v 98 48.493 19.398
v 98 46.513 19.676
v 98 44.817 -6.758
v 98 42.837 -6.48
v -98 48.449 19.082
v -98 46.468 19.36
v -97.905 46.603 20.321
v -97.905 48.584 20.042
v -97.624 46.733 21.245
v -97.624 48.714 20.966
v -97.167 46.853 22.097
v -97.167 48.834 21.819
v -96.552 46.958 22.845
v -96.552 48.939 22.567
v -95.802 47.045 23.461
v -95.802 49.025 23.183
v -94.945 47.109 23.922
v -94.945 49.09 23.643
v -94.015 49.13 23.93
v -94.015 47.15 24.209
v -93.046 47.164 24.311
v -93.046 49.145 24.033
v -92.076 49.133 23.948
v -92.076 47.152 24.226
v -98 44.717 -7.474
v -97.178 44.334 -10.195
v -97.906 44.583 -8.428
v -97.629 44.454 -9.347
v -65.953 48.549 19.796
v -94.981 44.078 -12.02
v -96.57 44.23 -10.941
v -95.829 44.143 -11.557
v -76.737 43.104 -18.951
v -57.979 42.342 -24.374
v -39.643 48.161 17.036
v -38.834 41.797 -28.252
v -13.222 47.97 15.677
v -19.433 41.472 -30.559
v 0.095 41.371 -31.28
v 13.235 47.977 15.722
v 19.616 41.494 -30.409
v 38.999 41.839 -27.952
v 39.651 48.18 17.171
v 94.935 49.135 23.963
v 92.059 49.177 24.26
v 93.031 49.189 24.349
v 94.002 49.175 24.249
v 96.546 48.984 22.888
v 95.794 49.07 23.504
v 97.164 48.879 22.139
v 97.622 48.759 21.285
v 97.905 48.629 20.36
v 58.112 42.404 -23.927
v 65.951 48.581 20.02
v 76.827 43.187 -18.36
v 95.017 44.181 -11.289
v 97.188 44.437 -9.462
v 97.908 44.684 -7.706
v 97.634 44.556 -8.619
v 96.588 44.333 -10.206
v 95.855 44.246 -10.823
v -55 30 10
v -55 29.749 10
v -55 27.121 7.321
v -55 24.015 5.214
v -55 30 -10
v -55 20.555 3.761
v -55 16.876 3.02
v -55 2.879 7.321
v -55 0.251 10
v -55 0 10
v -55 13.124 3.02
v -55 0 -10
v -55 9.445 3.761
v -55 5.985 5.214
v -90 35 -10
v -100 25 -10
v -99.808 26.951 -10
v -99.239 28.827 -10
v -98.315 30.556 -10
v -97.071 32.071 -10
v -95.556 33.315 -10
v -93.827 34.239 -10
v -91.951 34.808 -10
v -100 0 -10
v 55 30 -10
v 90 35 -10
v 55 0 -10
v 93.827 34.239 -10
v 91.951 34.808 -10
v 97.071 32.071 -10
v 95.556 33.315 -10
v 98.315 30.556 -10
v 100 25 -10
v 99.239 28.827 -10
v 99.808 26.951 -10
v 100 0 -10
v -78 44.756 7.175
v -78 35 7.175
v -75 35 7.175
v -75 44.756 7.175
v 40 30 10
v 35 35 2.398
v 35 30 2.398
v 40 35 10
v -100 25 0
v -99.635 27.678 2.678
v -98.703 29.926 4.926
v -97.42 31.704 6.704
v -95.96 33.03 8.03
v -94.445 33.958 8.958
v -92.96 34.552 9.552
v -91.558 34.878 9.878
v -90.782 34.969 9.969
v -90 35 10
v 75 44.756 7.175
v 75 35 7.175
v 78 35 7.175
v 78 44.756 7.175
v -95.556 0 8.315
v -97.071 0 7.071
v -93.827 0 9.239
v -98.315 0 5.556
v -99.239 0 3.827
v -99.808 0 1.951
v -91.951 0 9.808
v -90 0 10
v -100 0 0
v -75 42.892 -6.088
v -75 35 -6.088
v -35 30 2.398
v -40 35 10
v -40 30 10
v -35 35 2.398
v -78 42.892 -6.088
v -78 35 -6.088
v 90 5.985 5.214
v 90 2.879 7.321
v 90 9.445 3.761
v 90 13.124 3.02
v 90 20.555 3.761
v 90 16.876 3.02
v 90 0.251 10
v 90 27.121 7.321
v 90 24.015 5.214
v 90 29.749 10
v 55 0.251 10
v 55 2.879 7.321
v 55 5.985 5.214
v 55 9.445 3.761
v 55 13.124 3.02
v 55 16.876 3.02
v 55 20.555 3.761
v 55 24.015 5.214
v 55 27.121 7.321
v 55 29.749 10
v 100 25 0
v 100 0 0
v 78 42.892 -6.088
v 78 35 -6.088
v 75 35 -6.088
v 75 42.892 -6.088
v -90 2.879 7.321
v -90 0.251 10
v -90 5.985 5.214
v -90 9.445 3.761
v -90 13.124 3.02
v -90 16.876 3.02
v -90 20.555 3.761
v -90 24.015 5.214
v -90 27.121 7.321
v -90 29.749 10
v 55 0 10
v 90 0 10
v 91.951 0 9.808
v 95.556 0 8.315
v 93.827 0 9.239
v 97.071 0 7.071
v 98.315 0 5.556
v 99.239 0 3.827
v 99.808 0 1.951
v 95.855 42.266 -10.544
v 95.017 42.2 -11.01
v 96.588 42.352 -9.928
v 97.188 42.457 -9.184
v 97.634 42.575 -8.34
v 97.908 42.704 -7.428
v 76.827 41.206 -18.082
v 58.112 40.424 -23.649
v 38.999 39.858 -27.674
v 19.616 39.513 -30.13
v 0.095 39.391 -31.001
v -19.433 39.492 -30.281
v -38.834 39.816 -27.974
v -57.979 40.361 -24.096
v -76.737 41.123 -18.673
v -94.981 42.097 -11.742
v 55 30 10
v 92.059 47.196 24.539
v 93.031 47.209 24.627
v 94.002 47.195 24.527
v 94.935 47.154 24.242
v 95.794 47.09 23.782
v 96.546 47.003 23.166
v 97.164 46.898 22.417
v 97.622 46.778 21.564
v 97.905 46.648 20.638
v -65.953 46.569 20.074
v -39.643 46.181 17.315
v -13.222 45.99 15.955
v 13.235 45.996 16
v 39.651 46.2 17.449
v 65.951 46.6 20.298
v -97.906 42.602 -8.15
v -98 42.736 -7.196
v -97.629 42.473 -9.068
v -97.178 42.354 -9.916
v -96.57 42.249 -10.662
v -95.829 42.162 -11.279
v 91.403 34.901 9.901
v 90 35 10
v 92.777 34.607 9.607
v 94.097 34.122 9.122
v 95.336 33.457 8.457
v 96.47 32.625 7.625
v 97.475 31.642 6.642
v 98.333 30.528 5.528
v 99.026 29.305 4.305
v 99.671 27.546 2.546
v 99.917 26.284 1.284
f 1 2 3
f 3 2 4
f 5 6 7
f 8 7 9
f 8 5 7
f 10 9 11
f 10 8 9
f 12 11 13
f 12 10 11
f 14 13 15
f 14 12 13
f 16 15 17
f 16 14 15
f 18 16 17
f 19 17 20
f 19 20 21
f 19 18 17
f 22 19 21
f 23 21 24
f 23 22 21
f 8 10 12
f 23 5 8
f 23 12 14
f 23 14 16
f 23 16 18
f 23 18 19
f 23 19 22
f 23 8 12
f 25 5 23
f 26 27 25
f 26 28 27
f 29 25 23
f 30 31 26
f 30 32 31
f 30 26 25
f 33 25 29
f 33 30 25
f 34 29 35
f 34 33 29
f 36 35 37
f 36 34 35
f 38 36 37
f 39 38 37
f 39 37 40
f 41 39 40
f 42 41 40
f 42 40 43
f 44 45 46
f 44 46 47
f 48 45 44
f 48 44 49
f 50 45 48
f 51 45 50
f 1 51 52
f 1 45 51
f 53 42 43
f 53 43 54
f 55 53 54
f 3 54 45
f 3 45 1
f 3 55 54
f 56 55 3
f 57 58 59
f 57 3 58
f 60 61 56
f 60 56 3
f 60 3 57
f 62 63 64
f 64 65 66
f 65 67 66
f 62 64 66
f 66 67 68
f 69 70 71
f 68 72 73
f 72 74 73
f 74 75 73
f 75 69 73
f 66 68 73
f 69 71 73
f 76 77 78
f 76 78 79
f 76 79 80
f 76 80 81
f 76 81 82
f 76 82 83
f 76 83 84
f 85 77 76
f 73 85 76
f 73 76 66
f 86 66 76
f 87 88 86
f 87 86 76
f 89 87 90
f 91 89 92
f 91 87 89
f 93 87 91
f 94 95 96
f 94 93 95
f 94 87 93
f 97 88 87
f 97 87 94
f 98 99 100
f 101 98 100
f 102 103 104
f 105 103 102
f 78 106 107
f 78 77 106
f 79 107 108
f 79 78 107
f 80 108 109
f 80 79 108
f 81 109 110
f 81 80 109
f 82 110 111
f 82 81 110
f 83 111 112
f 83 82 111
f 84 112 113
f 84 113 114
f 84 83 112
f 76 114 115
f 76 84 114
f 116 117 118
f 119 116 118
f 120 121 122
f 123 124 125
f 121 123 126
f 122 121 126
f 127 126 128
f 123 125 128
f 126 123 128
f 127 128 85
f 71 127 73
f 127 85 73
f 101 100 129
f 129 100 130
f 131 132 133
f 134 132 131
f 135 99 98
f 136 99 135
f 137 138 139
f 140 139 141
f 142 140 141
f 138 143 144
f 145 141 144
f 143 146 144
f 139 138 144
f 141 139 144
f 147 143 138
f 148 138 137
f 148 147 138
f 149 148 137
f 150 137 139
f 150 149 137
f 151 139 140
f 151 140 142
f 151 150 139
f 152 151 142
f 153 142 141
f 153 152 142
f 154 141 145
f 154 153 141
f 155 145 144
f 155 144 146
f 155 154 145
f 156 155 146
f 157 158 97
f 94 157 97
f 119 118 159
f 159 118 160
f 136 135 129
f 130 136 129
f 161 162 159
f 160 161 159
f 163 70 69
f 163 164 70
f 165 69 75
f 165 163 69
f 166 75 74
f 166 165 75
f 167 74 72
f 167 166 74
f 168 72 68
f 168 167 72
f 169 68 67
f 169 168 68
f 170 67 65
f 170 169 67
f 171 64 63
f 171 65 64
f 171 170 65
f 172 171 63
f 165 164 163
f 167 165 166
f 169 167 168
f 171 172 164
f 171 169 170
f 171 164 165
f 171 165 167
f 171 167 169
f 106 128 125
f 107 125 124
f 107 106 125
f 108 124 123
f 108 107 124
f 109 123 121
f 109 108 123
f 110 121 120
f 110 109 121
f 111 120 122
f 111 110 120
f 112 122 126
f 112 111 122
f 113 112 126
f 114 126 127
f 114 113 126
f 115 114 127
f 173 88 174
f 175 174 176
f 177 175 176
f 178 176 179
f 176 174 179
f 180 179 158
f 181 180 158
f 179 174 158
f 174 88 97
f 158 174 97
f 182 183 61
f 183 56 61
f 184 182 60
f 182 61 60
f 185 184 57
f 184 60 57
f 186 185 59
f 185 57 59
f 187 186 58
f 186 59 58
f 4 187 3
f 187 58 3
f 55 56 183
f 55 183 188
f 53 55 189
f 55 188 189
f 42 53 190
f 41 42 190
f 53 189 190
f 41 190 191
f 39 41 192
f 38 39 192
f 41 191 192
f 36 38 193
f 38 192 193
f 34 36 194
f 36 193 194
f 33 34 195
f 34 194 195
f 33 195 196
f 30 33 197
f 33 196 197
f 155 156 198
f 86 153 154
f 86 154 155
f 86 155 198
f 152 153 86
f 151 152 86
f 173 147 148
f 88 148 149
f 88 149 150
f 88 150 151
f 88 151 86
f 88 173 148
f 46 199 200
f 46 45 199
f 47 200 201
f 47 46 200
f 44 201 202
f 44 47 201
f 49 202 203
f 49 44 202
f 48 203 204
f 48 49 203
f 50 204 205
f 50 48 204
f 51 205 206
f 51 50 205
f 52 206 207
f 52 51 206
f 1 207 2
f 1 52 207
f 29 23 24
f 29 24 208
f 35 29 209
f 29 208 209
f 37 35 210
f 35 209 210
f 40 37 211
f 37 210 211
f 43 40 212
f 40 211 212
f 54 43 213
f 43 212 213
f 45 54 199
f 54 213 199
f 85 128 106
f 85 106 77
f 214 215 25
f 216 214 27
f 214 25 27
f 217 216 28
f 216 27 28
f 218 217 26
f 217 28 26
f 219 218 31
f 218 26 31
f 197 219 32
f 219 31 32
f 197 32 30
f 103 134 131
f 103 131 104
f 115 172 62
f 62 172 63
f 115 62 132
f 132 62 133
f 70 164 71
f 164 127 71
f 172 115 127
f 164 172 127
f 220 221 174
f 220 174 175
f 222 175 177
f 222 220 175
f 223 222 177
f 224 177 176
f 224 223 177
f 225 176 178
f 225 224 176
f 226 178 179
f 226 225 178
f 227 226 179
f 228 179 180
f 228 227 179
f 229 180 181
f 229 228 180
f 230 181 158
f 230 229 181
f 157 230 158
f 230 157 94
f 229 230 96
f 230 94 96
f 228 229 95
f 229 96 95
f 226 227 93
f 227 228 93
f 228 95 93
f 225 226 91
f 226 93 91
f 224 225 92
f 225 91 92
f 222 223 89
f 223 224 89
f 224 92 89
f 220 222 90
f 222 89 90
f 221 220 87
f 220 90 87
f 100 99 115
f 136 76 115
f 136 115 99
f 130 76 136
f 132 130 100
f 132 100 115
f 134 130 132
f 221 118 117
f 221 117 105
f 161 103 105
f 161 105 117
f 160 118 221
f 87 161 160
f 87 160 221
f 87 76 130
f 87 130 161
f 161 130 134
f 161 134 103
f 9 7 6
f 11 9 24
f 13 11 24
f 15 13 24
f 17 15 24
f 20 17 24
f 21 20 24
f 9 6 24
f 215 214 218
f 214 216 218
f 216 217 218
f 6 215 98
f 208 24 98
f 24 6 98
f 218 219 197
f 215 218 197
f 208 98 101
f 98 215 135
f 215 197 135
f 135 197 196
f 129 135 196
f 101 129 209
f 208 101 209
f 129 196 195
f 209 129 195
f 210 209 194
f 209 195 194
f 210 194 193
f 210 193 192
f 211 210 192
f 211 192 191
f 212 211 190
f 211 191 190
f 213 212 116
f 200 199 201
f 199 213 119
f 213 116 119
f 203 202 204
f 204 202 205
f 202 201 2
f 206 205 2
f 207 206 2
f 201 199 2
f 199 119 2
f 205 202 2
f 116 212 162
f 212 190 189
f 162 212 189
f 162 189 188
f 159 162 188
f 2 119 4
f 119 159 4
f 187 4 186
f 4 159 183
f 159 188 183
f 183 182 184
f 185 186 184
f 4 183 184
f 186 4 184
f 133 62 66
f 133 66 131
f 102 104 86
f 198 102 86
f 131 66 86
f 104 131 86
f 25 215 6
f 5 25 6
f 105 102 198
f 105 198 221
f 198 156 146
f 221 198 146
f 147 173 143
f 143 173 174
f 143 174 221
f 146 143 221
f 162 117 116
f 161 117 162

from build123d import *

# Parameters (mm, degrees)
SKETCH1_W               = 45
SKETCH1_H               = 20
BOSS_EXTRUDE1_DEPTH     = 30
BOSS_EXTRUDE1_2_DEPTH   = 30
CUT_EXTRUDE1_DEPTH      = 90
CUT_EXTRUDE1_DEPTH_BACK = 90
SKETCH2_R               = 18.91234553
SKETCH4_W               = 200
SKETCH4_H               = 20
BOSS_EXTRUDE2_DEPTH     = 5
FILLET1_R               = 10
SKETCH5_W               = 3
SKETCH5_H               = 13.263798278
BOSS_EXTRUDE3_DEPTH     = 10
CHAMFER1_SIZE           = 2.108112521
CHAMFER1_SIZE_2         = 15
BOSS_EXTRUDE4_DEPTH     = 2
FILLET2_R               = 5
CUT_EXTRUDE2_DEPTH      = 111.469562822


# Some blends are built 0.0001 mm under size
with BuildPart() as part:
    # Sketch1 → Boss-Extrude1 (new body)
    with BuildSketch(Plane(origin=(0, 0, 0), x_dir=(1, 0, 0), z_dir=(0, 1, 0))):
        with Locations((-77.5, 0)):
            Rectangle(SKETCH1_W, SKETCH1_H)
    extrude(amount=BOSS_EXTRUDE1_DEPTH)


with BuildPart() as body_2:
    # Sketch1 → Boss-Extrude1 2 (new body)
    with BuildSketch(Plane(origin=(0, 0, 0), x_dir=(1, 0, 0), z_dir=(0, 1, 0))):
        with Locations((77.5, 0)):
            Rectangle(SKETCH1_W, SKETCH1_H)
    extrude(amount=BOSS_EXTRUDE1_2_DEPTH)


with BuildPart() as cut_extrude1_tool:
    # Sketch2 → Cut-Extrude1 (new, two sides: drawn at the far end of the back side and taken through both)
    with BuildSketch(Plane(origin=(0, 0, 0), x_dir=(0, 0, -1), z_dir=(1, 0, 0)).offset(-CUT_EXTRUDE1_DEPTH_BACK)):
        with Locations((-21.83879207, 15)):
            Circle(SKETCH2_R)
    extrude(amount=CUT_EXTRUDE1_DEPTH + CUT_EXTRUDE1_DEPTH_BACK)


with BuildPart() as part_1:
    add(part.part)

    # Cut-Extrude1: cut by cut_extrude1_tool
    add(cut_extrude1_tool.part, mode=Mode.SUBTRACT)



with BuildPart() as body_2_1:
    add(body_2.part)

    # Cut-Extrude1: cut by cut_extrude1_tool
    add(cut_extrude1_tool.part, mode=Mode.SUBTRACT)


with BuildPart() as part_2:
    add(part_1.part)

    add(body_2_1.part)  # Boss-Extrude2 merges body 2
    # Sketch4 → Boss-Extrude2 (add)
    with BuildSketch(Plane(origin=(0, 30, 0), x_dir=(1, 0, 0), z_dir=(0, 1, 0))):
        Rectangle(SKETCH4_W, SKETCH4_H)
    extrude(amount=BOSS_EXTRUDE2_DEPTH)

    # Fillet1
    fillet1_edges = [part_2.edges().sort_by_distance(p)[0] for p in [
        (100, 17.5, 10),
        (-100, 35, 0),
        (100, 35, 0),
        (-100, 17.5, 10),
    ]]
    fillet(fillet1_edges, radius=FILLET1_R - 0.0001)  # a hair under: the kernel refuses the full size

    # Sketch5 → Boss-Extrude3 (add)
    with BuildSketch(Plane(origin=(0, 35, 0), x_dir=(1, 0, 0), z_dir=(0, 1, 0))):
        with Locations((-76.5, -0.54359829)):
            Rectangle(SKETCH5_W, SKETCH5_H)
        with Locations((76.5, -0.54359829)):
            Rectangle(SKETCH5_W, SKETCH5_H)
    extrude(amount=BOSS_EXTRUDE3_DEPTH)

    # Chamfer1
    # the kernel refuses this chamfer: 15, 2.108112521 mm, written as the material it takes off along each edge
    with BuildSketch(Plane(origin=(-116.985961034, 45, -6.088300849), x_dir=(0, -0.9651598825854408, -0.26166085119417143), z_dir=(1, 0, 0)), Plane(origin=(36.014038966, 45, -6.088300849), x_dir=(0, -0.9651598825854406, -0.26166085119417176), z_dir=(1, 0, 0))) as chamfer1_piece_1:
        Polygon((CHAMFER1_SIZE * 0.965159882373, -CHAMFER1_SIZE * 0.261660851137), (-CHAMFER1_SIZE_2 * 0.261660851194, -CHAMFER1_SIZE_2 * 0.965159882585), (0, 0), align=None)
    extrude(amount=80.971922068, mode=Mode.SUBTRACT)

    # Sketch6 → Boss-Extrude4 (add)
    with BuildSketch(Plane(origin=(0, 42.900189564, -6.02922845), x_dir=(1, 0, 0), z_dir=(0, 0.9902680687415693, -0.13917310096007307))):
        with BuildLine():
            Line((-98, 4.441058829), (-98, -31.70498546))
            ThreePointArc((-98, -31.70498546), (0.017055636, -22.045990643), (98, -32.045090114))
            Line((98, -32.045090114), (98, 3.690476172))
            ThreePointArc((98, 3.690476172), (0.081000585, 25.217488155), (-98, 4.441058829))
        make_face()
    extrude(amount=BOSS_EXTRUDE4_DEPTH)

    # Fillet2
    fillet2_edges = [part_2.edges().sort_by_distance(p)[0] for p in [
        (98, 43.37684262, -9.822962262),
        (-98, 43.272381704, -10.566240301),
        (-98, 48.302938775, 25.22803317),
        (98, 48.350272194, 25.564827949),
    ]]
    fillet(fillet2_edges, radius=FILLET2_R)

    # Sketch7 → Cut-Extrude2 (cut, through all)
    with BuildSketch(Plane(origin=(0, 35, 0), x_dir=(1, 0, 0), z_dir=(0, 1, 0))):
        Polygon((-40, -10), (-35, -2.397862122), (35, -2.397862122), (40, -10), align=None)
    extrude(amount=-CUT_EXTRUDE2_DEPTH, mode=Mode.SUBTRACT)


solid = part_2.part
